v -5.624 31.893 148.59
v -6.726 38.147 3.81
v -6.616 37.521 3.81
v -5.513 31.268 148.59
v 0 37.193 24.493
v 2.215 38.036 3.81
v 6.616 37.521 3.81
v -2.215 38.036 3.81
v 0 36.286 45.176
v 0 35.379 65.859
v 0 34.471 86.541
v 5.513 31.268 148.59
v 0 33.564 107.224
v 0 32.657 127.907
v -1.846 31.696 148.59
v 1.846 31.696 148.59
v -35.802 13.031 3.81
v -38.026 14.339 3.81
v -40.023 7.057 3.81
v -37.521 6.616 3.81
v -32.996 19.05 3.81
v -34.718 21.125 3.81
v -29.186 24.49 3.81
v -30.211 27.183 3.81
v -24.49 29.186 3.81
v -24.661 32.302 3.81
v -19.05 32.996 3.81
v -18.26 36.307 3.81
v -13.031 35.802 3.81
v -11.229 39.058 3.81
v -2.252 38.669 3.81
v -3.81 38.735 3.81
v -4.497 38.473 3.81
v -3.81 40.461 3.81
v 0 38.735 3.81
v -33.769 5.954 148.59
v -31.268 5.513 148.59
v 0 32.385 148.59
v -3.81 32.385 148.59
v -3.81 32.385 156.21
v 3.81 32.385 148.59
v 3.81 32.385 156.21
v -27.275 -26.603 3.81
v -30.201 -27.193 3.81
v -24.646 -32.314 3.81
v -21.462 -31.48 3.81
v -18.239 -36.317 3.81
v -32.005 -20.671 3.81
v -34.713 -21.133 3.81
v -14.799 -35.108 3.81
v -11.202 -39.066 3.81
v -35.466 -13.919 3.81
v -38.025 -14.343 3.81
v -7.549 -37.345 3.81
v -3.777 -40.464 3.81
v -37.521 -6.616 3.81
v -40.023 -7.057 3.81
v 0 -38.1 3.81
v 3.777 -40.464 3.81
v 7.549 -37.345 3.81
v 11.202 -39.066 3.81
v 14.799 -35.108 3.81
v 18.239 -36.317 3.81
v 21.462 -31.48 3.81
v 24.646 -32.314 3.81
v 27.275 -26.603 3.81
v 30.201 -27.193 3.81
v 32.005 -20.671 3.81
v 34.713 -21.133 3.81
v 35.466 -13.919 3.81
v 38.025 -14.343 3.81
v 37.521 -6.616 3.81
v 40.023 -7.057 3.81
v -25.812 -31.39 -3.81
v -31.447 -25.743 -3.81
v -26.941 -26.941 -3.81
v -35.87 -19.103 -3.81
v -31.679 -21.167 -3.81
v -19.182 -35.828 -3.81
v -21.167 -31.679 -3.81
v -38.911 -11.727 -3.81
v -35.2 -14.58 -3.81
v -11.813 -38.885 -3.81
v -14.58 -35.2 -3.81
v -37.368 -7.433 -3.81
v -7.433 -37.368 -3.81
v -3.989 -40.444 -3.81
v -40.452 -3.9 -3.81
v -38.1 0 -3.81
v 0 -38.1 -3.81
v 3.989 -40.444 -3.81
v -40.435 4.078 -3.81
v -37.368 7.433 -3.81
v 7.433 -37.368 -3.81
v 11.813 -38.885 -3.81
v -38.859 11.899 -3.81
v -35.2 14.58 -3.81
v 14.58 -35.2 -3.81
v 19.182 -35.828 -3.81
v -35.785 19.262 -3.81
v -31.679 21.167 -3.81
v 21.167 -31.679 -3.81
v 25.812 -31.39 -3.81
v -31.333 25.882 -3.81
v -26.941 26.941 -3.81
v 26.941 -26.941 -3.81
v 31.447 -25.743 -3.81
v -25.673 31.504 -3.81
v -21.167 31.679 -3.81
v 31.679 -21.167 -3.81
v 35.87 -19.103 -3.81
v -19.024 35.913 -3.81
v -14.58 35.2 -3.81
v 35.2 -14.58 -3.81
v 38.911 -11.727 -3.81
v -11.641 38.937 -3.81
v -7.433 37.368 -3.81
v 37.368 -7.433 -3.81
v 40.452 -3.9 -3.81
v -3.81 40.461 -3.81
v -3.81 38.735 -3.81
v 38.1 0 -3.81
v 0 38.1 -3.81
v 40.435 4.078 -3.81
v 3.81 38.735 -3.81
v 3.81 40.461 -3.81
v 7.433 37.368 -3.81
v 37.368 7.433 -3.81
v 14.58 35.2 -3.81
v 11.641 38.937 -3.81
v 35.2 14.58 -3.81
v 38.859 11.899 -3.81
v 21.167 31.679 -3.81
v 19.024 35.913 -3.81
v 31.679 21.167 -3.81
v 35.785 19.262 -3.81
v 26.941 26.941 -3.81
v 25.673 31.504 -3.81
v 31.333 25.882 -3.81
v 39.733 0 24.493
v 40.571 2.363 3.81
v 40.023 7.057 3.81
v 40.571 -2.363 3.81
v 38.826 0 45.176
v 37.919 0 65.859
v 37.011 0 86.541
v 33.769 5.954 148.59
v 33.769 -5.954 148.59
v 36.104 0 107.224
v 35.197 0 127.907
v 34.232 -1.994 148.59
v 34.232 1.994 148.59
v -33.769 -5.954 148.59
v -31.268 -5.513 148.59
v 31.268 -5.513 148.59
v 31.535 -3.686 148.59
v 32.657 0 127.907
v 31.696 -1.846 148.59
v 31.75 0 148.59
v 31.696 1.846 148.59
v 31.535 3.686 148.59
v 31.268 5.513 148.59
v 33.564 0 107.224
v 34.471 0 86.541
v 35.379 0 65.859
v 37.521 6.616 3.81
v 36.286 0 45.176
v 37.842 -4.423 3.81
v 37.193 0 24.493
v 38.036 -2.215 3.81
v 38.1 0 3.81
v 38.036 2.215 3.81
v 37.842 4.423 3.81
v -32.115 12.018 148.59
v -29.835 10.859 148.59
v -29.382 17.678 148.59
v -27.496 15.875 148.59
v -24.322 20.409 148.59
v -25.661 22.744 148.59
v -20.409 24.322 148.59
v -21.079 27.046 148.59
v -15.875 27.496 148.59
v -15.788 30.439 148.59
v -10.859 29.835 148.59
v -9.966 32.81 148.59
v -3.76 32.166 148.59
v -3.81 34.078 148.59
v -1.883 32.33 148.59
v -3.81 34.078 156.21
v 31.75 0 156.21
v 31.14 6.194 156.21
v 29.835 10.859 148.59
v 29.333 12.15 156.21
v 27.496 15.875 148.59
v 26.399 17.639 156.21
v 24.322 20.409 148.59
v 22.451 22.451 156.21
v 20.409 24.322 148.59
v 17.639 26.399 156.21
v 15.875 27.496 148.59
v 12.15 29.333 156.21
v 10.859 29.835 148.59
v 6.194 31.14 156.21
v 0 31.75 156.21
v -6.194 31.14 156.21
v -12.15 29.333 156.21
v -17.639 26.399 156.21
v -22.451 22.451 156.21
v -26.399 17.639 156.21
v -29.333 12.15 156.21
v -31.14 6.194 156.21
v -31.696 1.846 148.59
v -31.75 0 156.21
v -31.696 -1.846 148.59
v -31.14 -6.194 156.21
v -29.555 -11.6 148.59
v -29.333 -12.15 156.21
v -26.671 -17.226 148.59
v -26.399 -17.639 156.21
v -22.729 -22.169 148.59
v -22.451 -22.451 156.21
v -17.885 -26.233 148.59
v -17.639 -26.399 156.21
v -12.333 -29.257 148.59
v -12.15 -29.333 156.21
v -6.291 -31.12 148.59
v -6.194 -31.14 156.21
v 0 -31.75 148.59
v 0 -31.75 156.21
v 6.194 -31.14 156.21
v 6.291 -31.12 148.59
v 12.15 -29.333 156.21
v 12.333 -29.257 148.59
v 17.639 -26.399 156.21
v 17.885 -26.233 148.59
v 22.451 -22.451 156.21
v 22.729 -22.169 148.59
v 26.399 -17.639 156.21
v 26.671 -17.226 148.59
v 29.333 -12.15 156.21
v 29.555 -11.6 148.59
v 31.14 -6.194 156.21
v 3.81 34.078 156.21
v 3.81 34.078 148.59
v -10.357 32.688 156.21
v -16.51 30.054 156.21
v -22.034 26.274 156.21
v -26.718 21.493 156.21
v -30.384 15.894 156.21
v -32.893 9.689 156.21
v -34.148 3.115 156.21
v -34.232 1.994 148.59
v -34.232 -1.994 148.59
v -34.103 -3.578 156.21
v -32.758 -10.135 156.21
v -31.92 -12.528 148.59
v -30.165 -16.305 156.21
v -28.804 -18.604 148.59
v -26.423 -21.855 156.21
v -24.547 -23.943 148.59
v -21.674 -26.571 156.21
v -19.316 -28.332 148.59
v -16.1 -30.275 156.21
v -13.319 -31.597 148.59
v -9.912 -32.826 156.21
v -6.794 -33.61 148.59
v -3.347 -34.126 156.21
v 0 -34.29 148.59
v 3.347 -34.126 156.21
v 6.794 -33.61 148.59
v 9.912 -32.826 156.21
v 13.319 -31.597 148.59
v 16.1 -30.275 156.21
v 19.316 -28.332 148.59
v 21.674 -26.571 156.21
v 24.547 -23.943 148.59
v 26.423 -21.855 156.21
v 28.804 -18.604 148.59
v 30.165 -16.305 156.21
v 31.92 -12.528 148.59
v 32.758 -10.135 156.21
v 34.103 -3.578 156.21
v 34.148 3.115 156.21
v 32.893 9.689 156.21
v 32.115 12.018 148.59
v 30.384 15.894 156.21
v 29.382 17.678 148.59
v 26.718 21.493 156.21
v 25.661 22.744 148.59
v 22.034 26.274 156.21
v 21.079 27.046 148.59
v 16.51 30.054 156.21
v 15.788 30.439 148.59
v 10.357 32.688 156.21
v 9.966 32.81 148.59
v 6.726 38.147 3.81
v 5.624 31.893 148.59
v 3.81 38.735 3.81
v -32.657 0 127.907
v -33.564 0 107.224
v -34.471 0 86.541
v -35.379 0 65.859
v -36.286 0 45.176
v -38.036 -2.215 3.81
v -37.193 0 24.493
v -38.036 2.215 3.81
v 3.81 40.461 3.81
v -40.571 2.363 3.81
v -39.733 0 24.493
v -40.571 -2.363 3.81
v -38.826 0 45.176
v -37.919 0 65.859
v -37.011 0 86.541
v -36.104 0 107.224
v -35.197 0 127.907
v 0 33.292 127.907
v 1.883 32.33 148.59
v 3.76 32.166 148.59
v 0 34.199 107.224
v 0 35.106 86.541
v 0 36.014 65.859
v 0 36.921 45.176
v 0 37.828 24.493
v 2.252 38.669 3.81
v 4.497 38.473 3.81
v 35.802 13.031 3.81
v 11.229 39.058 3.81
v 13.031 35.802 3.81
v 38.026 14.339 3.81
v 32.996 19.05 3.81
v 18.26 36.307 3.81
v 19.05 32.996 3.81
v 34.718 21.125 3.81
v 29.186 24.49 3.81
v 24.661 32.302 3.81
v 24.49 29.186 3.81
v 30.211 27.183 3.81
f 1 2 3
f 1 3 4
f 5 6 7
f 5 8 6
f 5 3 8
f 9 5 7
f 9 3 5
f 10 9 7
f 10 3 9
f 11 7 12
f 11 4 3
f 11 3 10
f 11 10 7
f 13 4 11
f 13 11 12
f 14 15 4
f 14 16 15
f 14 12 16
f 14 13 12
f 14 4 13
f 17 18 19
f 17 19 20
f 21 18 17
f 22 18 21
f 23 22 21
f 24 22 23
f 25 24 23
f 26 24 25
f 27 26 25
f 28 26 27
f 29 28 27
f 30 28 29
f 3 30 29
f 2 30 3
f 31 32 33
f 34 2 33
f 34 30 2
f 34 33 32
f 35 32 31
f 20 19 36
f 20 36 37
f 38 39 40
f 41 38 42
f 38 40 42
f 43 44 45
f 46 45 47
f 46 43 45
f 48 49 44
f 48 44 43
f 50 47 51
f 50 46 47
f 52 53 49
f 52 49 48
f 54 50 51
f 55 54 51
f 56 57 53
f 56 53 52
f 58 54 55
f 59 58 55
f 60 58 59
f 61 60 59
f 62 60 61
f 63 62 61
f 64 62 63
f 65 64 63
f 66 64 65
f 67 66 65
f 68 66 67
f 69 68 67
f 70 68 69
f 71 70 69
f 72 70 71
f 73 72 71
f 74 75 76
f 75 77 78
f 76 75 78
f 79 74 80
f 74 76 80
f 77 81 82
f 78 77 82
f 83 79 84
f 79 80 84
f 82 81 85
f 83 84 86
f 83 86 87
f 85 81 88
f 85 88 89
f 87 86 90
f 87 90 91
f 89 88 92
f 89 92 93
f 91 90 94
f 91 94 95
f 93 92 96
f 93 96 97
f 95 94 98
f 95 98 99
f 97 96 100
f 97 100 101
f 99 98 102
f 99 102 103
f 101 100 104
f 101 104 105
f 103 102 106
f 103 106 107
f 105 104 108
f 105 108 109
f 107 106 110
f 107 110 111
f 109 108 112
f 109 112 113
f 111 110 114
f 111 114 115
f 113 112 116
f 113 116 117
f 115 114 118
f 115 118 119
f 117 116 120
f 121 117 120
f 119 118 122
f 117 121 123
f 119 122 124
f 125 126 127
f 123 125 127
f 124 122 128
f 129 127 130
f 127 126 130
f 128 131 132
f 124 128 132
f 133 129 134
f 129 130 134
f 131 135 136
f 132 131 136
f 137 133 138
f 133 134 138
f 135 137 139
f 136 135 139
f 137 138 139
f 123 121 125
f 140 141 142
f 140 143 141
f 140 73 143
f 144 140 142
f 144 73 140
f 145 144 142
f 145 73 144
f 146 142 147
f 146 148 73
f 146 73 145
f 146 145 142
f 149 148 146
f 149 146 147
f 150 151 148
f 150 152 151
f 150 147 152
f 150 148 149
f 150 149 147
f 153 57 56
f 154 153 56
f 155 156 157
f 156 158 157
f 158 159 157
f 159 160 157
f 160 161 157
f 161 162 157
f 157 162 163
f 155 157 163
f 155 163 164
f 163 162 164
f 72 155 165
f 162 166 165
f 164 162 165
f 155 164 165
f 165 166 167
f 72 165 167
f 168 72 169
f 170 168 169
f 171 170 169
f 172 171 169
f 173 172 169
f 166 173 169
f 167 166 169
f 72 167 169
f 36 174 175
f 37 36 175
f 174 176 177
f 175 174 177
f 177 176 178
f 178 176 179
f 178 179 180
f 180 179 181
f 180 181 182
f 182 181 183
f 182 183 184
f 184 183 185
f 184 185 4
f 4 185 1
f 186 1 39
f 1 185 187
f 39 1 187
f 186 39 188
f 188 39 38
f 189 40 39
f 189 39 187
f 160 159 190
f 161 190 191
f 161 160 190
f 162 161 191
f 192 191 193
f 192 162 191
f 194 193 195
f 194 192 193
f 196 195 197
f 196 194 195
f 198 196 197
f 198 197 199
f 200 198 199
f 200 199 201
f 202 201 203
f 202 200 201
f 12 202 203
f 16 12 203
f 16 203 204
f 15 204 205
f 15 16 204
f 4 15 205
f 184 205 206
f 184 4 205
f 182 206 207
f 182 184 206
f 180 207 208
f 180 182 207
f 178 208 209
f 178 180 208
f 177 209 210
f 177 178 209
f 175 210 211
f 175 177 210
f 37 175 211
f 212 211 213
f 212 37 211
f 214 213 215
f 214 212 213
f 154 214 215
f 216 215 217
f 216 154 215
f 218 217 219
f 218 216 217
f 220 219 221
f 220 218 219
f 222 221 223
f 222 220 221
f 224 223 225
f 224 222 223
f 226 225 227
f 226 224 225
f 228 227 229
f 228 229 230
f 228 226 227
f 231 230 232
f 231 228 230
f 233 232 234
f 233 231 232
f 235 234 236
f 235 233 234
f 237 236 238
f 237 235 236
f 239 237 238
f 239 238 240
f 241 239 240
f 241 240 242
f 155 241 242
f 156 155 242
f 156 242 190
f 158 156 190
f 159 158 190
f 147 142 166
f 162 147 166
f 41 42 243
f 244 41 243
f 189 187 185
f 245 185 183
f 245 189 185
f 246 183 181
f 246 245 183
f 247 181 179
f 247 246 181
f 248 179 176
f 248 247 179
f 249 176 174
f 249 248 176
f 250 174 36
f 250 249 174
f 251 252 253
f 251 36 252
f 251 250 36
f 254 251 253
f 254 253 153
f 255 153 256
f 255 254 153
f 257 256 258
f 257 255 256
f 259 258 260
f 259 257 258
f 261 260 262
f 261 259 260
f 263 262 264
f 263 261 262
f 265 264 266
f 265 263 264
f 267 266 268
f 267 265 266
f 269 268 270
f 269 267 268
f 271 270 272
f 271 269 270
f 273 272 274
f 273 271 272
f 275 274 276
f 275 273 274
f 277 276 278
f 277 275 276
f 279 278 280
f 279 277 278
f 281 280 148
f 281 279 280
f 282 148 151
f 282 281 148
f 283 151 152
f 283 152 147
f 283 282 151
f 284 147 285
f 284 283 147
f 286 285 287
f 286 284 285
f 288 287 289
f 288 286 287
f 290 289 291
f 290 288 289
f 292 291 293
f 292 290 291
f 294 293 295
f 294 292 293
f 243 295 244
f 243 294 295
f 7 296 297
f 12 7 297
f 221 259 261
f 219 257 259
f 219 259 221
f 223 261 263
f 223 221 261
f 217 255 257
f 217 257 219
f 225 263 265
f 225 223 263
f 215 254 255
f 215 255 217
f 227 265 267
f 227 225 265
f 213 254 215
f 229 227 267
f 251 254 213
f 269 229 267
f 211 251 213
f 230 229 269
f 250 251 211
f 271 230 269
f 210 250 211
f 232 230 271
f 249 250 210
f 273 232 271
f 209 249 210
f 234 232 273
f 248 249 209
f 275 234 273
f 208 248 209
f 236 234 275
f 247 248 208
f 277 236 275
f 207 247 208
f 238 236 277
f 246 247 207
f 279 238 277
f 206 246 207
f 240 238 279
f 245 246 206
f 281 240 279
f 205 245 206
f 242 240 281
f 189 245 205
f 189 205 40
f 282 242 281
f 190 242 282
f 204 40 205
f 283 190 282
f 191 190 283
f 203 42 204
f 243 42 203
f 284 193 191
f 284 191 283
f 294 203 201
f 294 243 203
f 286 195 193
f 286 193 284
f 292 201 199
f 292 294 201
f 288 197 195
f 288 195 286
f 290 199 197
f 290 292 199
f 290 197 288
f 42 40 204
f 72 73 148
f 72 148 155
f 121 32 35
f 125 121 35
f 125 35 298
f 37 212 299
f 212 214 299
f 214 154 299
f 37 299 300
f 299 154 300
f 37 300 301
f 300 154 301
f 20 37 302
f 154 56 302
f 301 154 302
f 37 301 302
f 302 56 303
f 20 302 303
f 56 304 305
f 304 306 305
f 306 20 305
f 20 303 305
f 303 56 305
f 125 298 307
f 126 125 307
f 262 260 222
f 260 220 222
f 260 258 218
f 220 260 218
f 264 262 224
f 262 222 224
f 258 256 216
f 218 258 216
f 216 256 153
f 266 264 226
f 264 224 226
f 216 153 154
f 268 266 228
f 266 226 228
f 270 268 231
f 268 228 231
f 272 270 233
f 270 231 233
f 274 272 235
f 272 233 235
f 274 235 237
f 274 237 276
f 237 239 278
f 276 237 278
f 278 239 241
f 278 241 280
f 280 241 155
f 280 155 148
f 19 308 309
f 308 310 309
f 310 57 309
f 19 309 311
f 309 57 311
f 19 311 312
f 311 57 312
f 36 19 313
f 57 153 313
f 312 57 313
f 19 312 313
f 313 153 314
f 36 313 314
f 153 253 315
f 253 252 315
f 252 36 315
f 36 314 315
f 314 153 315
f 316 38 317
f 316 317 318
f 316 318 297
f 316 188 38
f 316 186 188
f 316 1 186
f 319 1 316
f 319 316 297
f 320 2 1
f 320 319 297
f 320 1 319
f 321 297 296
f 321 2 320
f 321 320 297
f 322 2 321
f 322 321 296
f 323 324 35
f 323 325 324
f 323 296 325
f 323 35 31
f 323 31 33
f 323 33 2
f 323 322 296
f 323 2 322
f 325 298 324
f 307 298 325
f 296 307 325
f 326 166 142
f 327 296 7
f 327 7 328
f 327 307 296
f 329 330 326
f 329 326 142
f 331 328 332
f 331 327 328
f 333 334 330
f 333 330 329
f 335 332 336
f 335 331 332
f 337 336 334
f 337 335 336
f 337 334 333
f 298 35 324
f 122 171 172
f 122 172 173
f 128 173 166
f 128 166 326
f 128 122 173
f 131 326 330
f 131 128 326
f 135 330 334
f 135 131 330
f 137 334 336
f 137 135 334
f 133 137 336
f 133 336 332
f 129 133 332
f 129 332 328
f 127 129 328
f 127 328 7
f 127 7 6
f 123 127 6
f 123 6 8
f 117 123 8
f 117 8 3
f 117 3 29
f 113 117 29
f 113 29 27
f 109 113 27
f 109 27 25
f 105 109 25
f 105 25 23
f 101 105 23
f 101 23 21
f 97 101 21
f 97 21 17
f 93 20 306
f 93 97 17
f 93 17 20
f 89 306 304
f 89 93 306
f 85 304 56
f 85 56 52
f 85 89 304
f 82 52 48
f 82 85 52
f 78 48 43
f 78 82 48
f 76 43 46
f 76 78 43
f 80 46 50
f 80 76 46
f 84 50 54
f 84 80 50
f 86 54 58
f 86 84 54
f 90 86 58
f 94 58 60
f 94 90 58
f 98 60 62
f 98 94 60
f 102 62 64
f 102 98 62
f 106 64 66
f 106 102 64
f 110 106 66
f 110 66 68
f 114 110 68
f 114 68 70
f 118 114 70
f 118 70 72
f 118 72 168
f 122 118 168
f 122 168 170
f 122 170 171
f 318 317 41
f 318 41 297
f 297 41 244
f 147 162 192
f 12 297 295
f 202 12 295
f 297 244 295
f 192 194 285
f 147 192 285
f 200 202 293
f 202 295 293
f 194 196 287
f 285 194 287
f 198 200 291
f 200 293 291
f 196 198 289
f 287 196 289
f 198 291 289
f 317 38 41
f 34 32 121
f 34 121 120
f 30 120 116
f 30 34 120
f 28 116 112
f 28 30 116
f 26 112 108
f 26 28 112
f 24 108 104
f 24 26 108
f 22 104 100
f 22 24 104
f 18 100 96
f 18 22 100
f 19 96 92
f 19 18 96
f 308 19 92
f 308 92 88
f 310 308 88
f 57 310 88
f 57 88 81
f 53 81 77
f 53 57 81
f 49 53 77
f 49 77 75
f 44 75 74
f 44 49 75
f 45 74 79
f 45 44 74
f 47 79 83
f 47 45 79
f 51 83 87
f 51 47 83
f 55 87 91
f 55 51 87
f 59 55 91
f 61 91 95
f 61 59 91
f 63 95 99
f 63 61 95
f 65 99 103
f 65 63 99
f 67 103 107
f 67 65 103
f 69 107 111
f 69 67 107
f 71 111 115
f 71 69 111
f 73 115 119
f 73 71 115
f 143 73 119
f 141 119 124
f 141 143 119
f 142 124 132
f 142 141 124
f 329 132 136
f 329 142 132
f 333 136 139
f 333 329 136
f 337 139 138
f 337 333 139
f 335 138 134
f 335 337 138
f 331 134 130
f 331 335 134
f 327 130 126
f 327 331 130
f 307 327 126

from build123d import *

# Parameters (mm, degrees)
SKETCH1_R                      = 40.64
SKETCH1_R_2                    = 38.1
BOSS_EXTRUDE1_DEPTH            = 3.81
CUT_EXTRUDE1_REACH             = 5.81
SKETCH2_W                      = 7.62
SKETCH2_H                      = 3.81
CUT_EXTRUDE1_DIRECTION_2_REACH = 5.81
SKETCH3_R                      = 34.29
SKETCH3_R_2                    = 31.75
BOSS_EXTRUDE2_DEPTH            = 3.81
REVOLVE1_ANGLE                 = 10
REVOLVE1_OTHER_WAY_ANGLE       = 10
CUT_EXTRUDE2_REACH             = 162.02
SKETCH6_W                      = 7.62
SKETCH6_H                      = 3.81
REVOLVE2_ANGLE                 = 10
REVOLVE2_OTHER_WAY_ANGLE       = 10


with BuildPart() as part:
    # Sketch1 → Boss-Extrude1 (new body, symmetric)
    with BuildSketch(Plane.XY):
        Circle(SKETCH1_R)
        Circle(SKETCH1_R_2, mode=Mode.SUBTRACT)
    extrude(amount=BOSS_EXTRUDE1_DEPTH, both=True)

    # Sketch2 → Cut-Extrude1 (cut, up to next)
    with BuildSketch(Plane.XY, mode=Mode.PRIVATE) as cut_extrude1_sk1:
        with Locations((0, 40.64)):
            Rectangle(SKETCH2_W, SKETCH2_H)
    cut_extrude1_tool1 = extrude(cut_extrude1_sk1.sketch, amount=-CUT_EXTRUDE1_REACH, mode=Mode.PRIVATE) & part.part
    add(cut_extrude1_tool1.solids().sort_by_distance((0, 40.64, 0))[0], mode=Mode.SUBTRACT)

    # Sketch2 → Cut-Extrude1 direction 2 (cut, up to next)
    with BuildSketch(Plane.XY, mode=Mode.PRIVATE) as cut_extrude1_direction_2_sk1:
        with Locations((0, 40.64)):
            Rectangle(SKETCH2_W, SKETCH2_H)
    cut_extrude1_direction_2_tool1 = extrude(cut_extrude1_direction_2_sk1.sketch, amount=CUT_EXTRUDE1_DIRECTION_2_REACH, mode=Mode.PRIVATE) & part.part
    add(cut_extrude1_direction_2_tool1.solids().sort_by_distance((0, 40.64, 0))[0], mode=Mode.SUBTRACT)



with BuildPart() as body_2:
    # Sketch3 → Boss-Extrude2 (new body, symmetric)
    with BuildSketch(Plane.XY.offset(152.4)):
        Circle(SKETCH3_R)
        Circle(SKETCH3_R_2, mode=Mode.SUBTRACT)
    extrude(amount=BOSS_EXTRUDE2_DEPTH, both=True)


with BuildPart() as part_1:
    add(part.part)

    add(body_2.part)  # Revolve1 merges body 2
    # Sketch5 → Revolve1 (revolve)
    with BuildSketch(Plane(origin=(0, 0, 0), x_dir=(1, 0, 0), z_dir=(0, 1, 0))):
        Polygon((-40.64, -3.81), (-34.29, -148.59), (-31.75, -148.59), (-38.1, -3.81), align=None)
        Polygon((40.64, -3.81), (34.29, -148.59), (31.75, -148.59), (38.1, -3.81), align=None)
    revolve(axis=Axis((0, 0, -17.154345007), (0, 0, 1)), revolution_arc=REVOLVE1_ANGLE)

    # Sketch5 → Revolve1 other way (revolve)
    with BuildSketch(Plane(origin=(0, 0, 0), x_dir=(1, 0, 0), z_dir=(0, 1, 0))):
        Polygon((-40.64, -3.81), (-34.29, -148.59), (-31.75, -148.59), (-38.1, -3.81), align=None)
        Polygon((40.64, -3.81), (34.29, -148.59), (31.75, -148.59), (38.1, -3.81), align=None)
    revolve(axis=Axis((0, 0, -17.154345007), (0, 0, -1)), revolution_arc=REVOLVE1_OTHER_WAY_ANGLE)

    # Sketch6 → Cut-Extrude2 (cut, up to next)
    with BuildSketch(Plane.XY.offset(156.21), mode=Mode.PRIVATE) as cut_extrude2_sk1:
        with Locations((0, 34.29)):
            Rectangle(SKETCH6_W, SKETCH6_H)
    cut_extrude2_tool1 = extrude(cut_extrude2_sk1.sketch, amount=-CUT_EXTRUDE2_REACH, mode=Mode.PRIVATE) & part_1.part
    add(cut_extrude2_tool1.solids().sort_by_distance((0, 34.29, 156.21))[0], mode=Mode.SUBTRACT)

    # Sketch11 → Revolve2 (revolve)
    with BuildSketch(Plane(origin=(0, 0, 0), x_dir=(0, 0, -1), z_dir=(1, 0, 0))):
        Polygon((-148.59, 32.385), (-3.81, 38.735), (-3.81, 38.1), (-148.59, 31.75), align=None)
    revolve(axis=Axis((0, 0, 0), (0, 0, 1)), revolution_arc=REVOLVE2_ANGLE)

    # Sketch11 → Revolve2 other way (revolve)
    with BuildSketch(Plane(origin=(0, 0, 0), x_dir=(0, 0, -1), z_dir=(1, 0, 0))):
        Polygon((-148.59, 32.385), (-3.81, 38.735), (-3.81, 38.1), (-148.59, 31.75), align=None)
    revolve(axis=Axis((0, 0, 0), (0, 0, -1)), revolution_arc=REVOLVE2_OTHER_WAY_ANGLE)


solid = part_1.part
